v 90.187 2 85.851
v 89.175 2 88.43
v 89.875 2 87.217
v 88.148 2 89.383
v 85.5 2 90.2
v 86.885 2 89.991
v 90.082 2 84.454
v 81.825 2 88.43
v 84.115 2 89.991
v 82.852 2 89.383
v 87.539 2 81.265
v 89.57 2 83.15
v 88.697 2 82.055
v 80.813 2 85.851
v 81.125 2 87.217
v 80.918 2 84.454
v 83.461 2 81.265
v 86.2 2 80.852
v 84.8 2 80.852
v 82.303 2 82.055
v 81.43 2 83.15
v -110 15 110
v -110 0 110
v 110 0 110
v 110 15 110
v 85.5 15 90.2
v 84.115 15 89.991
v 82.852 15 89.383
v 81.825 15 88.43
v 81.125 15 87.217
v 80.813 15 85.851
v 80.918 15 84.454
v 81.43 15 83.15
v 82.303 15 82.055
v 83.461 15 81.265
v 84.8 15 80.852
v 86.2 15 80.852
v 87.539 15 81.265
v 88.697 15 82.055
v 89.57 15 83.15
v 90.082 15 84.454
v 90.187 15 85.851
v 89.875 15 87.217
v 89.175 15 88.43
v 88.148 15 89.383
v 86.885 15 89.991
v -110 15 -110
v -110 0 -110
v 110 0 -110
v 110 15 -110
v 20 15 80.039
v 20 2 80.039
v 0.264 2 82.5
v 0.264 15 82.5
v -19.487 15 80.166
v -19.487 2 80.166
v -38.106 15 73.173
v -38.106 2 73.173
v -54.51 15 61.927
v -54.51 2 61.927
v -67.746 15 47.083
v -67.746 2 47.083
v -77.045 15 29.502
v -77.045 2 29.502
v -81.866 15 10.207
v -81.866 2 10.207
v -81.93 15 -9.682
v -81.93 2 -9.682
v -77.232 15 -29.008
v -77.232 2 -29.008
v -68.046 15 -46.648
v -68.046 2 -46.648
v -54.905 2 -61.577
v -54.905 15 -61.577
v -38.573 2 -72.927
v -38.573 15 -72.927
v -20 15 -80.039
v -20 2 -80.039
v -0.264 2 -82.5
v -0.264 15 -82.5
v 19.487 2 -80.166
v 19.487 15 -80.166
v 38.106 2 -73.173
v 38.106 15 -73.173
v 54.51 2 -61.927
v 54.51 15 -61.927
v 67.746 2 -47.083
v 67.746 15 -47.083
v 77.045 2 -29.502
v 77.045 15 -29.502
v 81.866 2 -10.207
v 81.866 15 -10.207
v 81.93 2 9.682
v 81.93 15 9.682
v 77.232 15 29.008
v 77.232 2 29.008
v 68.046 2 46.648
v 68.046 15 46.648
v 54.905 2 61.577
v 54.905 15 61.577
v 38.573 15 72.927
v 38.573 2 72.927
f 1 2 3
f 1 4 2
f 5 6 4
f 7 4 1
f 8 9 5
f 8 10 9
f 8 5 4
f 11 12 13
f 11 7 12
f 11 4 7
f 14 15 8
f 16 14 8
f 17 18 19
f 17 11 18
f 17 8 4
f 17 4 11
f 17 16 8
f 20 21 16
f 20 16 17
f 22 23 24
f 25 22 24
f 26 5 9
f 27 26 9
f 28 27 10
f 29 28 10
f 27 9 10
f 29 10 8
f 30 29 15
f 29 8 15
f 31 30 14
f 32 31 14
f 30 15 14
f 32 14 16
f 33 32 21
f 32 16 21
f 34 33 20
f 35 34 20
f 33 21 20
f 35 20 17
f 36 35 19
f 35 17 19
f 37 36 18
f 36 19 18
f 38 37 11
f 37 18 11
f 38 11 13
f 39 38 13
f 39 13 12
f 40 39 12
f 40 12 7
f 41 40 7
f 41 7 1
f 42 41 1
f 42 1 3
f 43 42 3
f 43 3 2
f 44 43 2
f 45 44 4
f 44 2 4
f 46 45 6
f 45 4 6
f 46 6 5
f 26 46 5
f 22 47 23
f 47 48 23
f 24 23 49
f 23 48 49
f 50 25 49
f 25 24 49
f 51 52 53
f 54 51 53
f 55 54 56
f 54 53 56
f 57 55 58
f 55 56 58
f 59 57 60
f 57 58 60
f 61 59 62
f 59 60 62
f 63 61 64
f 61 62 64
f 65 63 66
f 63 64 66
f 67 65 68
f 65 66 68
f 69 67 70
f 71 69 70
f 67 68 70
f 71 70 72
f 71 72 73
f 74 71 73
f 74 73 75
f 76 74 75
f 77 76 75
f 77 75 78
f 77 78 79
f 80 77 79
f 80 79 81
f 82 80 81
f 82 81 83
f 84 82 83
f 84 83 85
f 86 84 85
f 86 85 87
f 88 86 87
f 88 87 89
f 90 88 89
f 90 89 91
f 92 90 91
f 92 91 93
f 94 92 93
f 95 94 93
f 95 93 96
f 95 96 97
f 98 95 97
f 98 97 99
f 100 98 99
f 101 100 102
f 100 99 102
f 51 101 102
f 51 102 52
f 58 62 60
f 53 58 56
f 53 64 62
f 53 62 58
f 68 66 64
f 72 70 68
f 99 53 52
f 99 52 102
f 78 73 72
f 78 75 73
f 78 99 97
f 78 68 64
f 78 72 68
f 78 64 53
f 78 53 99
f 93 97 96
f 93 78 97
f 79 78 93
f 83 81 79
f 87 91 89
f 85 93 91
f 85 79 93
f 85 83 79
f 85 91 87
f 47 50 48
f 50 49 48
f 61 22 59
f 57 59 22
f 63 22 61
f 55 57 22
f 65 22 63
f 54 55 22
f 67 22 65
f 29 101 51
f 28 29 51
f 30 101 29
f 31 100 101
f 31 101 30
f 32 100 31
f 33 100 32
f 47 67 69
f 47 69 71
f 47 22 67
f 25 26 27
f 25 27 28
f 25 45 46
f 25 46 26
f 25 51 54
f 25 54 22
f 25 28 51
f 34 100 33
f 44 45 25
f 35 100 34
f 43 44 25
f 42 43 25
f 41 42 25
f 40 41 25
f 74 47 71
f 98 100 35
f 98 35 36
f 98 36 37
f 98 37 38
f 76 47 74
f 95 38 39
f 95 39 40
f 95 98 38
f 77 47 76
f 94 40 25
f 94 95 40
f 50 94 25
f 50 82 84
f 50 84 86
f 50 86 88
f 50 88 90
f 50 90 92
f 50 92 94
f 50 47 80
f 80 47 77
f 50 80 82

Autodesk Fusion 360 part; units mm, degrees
sketch "Sketch1" plane through (0, 0, 0) normal (0, 1, 0) x (1, 0, 0)
  line L0 (110, 110) -> (-110, 110)
  line L1 (-110, 110) -> (-110, -110)
  line L2 (-110, -110) -> (110, -110)
  line L3 (110, -110) -> (110, 110)
  line L4 (110, 110) -> (-110, -110) construction
  line L5 (-110, 110) -> (110, -110) construction
  circle A0 centre (0, 0) radius 82.5
  circle A1 centre (-85.5, -85.5) radius 15
  circle A2 centre (85.5, -85.5) radius 15
  circle A3 centre (85.5, 85.5) radius 15
  circle A4 centre (-85.5, 85.5) radius 15
  line L6 (0, -110) -> (0, 0) construction
  line L7 (-20, -110) -> (-20, -80.0391)
  line L8 (20, -110) -> (20, -80.0391)
  point P0 (-85.5, -85.5)
  point P1 (85.5, -85.5)
  point P2 (85.5, 85.5)
  point P3 (-85.5, 85.5)
  dimension "d1" = 220
  dimension "d2" = 220
  dimension "d3" = 24.5
  dimension "d4" = 24.5
  dimension "d6" = 360
  dimension "d11" = 165
  dimension "d13" = 30
  dimension "d15" = 360
  dimension "d41" = 20
extrude "Extrude1" add sketch "Sketch1" along normal blind 2 contours L0 L1 L2 L3 A0 L7 L8 | L2 A0 L7 L8 | A0 | A1 | A2 | A3 | A4
sketch "Sketch2" plane through (0, 2, 0) normal (0, 1, 0) x (-1, 0, 0)
  line L0 (-110, 110) -> (-110, -110)
  line L1 (-110, -110) -> (110, -110)
  line L2 (110, -110) -> (110, 110)
  line L3 (110, 110) -> (-110, 110)
  point P0 (85.5, 85.5)
extrude "Extrude2" add sketch "Sketch1" along normal blind 13 from surface at 2 contours L0 L1 L2 L3 A0 L7 L8 | A2 | A3 | A4
sketch "Sketch3" plane through (0, 15, 0) normal (0, 1, 0) x (-1, 0, 0)
  line L0 (110, 110) -> (20, 110)
  line L1 (-110, 110) -> (-110, -110)
  line L2 (-110, -110) -> (110, -110)
  line L3 (110, -110) -> (110, 110)
  circle A0 centre (85.5, 85.5) radius 15
  line L4 (20, 110) -> (20, 80.0391)
  arc A1 (-20, 80.0391) -> (20, 80.0391) centre (0, 0) ccw
  line L5 (-20, 80.0391) -> (-20, 110)
  line L6 (-20, 110) -> (-110, 110)
  point P0 (85.5, -85.5)
  point P1 (-85.5, -85.5)
  point P2 (85.5, 85.5)
  point P3 (-85.5, 85.5)
hole "Hole3" at (-85.5, 15, -85.5) at (85.5, 15, -85.5) at (-85.5, 15, 85.5) at (85.5, 15, 85.5) direction (0, -1, 0) diameter 4.5 depth 15 tip angle 180
hole "Hole5" at (-85.5, 15, -85.5) at (-85.5, 15, 85.5) at (85.5, 15, 85.5) at (85.5, 15, -85.5) direction (0, -1, 0) diameter 9.4 depth 13 tip angle 118
pattern_circular "C-Pattern1" count 2 over 90 about axis through (0, 1.75, 0) along (0, 1, 0) of "Extrude1", "Extrude2"
equation "overall_height = 15 mm"
equation "cutout_depth = 13 mm"
equation "wafer_slot_diameter = 165 mm"
equation "cuevette_slot_diam = 30 mm"
equation "d11 = wafer_slot_diameter"
equation "screw_plate_thickness = 2 mm"
equation "d13 = cuevette_slot_diam"
equation "d16 = screw_plate_thickness"
equation "d18 = overall_height - screw_plate_thickness"
equation "d20 = screw_plate_thickness"
equation "d42 = overall_height - screw_plate_thickness"
